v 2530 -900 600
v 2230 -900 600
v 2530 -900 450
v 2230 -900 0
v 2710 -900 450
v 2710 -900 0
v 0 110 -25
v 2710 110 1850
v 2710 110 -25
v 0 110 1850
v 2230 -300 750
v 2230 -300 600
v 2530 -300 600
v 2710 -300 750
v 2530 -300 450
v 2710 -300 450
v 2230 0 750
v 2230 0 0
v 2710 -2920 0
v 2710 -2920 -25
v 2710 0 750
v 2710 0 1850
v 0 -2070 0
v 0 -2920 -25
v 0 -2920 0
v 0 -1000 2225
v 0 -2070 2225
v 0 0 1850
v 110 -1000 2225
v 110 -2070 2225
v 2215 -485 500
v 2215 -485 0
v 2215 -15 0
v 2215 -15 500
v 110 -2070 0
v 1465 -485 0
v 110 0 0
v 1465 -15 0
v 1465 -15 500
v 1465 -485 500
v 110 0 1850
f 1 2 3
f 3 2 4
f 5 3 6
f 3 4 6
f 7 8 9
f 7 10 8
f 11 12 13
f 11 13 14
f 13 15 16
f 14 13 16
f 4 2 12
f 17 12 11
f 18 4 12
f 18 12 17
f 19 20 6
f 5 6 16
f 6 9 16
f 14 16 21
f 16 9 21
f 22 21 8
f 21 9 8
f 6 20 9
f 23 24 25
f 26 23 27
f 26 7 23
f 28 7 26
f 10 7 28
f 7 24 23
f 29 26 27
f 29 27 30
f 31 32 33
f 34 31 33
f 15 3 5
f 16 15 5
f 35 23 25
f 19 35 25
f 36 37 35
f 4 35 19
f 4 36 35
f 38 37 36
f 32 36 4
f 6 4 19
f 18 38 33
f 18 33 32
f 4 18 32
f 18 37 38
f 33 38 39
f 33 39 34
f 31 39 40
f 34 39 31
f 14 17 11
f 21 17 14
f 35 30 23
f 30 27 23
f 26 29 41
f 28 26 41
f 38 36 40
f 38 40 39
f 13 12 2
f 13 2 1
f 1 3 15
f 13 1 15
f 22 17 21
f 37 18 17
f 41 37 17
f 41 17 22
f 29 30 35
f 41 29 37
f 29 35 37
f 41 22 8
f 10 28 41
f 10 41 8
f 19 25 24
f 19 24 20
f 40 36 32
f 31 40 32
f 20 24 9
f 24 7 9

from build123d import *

# Parameters (mm, degrees)
F0_W      = 110
F0_H      = 2070
F1_DEPTH  = 2225
F2_W      = 1780
F2_H      = 110
F3_DEPTH  = 1850
F5_DEPTH  = 110
F6_W      = 1780
F6_H      = 2180
F7_DEPTH  = 25
F8_DEPTH  = 930
F9_W      = 480
F9_H      = 900
F10_DEPTH = 450
F11_W     = 480
F11_H     = 300
F12_DEPTH = 300
F13_W     = 300
F13_H     = 600
F14_DEPTH = 150
F15_W     = 750
F15_H     = 470
F16_DEPTH = 500
F17_W     = 2710
F17_H     = 25
F18_DEPTH = 850


with BuildPart() as f1:
    # F0 (on Top) → F1 (new body)
    with BuildSketch(Plane.XY):
        with Locations((55, -1035)):
            Rectangle(F0_W, F0_H)
    extrude(amount=F1_DEPTH)

    # F2 (on Top) → F3 (join)
    with BuildSketch(Plane.XY):
        with Locations((890, 55)):
            Rectangle(F2_W, F2_H)
    extrude(amount=F3_DEPTH)

    # F4 (on face) → F5 (cut)
    with BuildSketch(Plane.YZ.offset(110)):
        Polygon((-1000, 2225), (0, 1850), (0, 2225), align=None)
    extrude(amount=-F5_DEPTH, mode=Mode.SUBTRACT)

    # F6 (on face) → F7 (join)
    with BuildSketch(Plane(origin=(0, 0, 0), x_dir=(1, 0, 0), z_dir=(0, 0, -1))):
        with Locations((890, 980)):
            Rectangle(F6_W, F6_H)
    extrude(amount=F7_DEPTH)

    # F8 (add): a face of the model
    f8_faces = [f1.faces().sort_by_distance(p)[0] for p in [
        (1780, 28.7541736101, 925),
    ]]
    extrude(f8_faces, amount=F8_DEPTH)

    # F9 (on face) → F10 (join)
    with BuildSketch(Plane.XY):
        with Locations((2470, -450)):
            Rectangle(F9_W, F9_H)
    extrude(amount=F10_DEPTH)

    # F11 (on face) → F12 (join)
    with BuildSketch(Plane.XY.offset(450)):
        with Locations((2470, -150)):
            Rectangle(F11_W, F11_H)
    extrude(amount=F12_DEPTH)

    # F13 (on face) → F14 (join)
    with BuildSketch(Plane.XY.offset(450)):
        with Locations((2380, -600)):
            Rectangle(F13_W, F13_H)
    extrude(amount=F14_DEPTH)

    # F15 (on face) → F16 (join)
    with BuildSketch(Plane.XY):
        with Locations((1840, -250)):
            Rectangle(F15_W, F15_H)
    extrude(amount=F16_DEPTH)

    # F17 (on face) → F18 (join)
    with BuildSketch(Plane.XZ.offset(2070)):
        with Locations((1355, -12.5)):
            Rectangle(F17_W, F17_H)
    extrude(amount=F18_DEPTH)


solid = f1.part
